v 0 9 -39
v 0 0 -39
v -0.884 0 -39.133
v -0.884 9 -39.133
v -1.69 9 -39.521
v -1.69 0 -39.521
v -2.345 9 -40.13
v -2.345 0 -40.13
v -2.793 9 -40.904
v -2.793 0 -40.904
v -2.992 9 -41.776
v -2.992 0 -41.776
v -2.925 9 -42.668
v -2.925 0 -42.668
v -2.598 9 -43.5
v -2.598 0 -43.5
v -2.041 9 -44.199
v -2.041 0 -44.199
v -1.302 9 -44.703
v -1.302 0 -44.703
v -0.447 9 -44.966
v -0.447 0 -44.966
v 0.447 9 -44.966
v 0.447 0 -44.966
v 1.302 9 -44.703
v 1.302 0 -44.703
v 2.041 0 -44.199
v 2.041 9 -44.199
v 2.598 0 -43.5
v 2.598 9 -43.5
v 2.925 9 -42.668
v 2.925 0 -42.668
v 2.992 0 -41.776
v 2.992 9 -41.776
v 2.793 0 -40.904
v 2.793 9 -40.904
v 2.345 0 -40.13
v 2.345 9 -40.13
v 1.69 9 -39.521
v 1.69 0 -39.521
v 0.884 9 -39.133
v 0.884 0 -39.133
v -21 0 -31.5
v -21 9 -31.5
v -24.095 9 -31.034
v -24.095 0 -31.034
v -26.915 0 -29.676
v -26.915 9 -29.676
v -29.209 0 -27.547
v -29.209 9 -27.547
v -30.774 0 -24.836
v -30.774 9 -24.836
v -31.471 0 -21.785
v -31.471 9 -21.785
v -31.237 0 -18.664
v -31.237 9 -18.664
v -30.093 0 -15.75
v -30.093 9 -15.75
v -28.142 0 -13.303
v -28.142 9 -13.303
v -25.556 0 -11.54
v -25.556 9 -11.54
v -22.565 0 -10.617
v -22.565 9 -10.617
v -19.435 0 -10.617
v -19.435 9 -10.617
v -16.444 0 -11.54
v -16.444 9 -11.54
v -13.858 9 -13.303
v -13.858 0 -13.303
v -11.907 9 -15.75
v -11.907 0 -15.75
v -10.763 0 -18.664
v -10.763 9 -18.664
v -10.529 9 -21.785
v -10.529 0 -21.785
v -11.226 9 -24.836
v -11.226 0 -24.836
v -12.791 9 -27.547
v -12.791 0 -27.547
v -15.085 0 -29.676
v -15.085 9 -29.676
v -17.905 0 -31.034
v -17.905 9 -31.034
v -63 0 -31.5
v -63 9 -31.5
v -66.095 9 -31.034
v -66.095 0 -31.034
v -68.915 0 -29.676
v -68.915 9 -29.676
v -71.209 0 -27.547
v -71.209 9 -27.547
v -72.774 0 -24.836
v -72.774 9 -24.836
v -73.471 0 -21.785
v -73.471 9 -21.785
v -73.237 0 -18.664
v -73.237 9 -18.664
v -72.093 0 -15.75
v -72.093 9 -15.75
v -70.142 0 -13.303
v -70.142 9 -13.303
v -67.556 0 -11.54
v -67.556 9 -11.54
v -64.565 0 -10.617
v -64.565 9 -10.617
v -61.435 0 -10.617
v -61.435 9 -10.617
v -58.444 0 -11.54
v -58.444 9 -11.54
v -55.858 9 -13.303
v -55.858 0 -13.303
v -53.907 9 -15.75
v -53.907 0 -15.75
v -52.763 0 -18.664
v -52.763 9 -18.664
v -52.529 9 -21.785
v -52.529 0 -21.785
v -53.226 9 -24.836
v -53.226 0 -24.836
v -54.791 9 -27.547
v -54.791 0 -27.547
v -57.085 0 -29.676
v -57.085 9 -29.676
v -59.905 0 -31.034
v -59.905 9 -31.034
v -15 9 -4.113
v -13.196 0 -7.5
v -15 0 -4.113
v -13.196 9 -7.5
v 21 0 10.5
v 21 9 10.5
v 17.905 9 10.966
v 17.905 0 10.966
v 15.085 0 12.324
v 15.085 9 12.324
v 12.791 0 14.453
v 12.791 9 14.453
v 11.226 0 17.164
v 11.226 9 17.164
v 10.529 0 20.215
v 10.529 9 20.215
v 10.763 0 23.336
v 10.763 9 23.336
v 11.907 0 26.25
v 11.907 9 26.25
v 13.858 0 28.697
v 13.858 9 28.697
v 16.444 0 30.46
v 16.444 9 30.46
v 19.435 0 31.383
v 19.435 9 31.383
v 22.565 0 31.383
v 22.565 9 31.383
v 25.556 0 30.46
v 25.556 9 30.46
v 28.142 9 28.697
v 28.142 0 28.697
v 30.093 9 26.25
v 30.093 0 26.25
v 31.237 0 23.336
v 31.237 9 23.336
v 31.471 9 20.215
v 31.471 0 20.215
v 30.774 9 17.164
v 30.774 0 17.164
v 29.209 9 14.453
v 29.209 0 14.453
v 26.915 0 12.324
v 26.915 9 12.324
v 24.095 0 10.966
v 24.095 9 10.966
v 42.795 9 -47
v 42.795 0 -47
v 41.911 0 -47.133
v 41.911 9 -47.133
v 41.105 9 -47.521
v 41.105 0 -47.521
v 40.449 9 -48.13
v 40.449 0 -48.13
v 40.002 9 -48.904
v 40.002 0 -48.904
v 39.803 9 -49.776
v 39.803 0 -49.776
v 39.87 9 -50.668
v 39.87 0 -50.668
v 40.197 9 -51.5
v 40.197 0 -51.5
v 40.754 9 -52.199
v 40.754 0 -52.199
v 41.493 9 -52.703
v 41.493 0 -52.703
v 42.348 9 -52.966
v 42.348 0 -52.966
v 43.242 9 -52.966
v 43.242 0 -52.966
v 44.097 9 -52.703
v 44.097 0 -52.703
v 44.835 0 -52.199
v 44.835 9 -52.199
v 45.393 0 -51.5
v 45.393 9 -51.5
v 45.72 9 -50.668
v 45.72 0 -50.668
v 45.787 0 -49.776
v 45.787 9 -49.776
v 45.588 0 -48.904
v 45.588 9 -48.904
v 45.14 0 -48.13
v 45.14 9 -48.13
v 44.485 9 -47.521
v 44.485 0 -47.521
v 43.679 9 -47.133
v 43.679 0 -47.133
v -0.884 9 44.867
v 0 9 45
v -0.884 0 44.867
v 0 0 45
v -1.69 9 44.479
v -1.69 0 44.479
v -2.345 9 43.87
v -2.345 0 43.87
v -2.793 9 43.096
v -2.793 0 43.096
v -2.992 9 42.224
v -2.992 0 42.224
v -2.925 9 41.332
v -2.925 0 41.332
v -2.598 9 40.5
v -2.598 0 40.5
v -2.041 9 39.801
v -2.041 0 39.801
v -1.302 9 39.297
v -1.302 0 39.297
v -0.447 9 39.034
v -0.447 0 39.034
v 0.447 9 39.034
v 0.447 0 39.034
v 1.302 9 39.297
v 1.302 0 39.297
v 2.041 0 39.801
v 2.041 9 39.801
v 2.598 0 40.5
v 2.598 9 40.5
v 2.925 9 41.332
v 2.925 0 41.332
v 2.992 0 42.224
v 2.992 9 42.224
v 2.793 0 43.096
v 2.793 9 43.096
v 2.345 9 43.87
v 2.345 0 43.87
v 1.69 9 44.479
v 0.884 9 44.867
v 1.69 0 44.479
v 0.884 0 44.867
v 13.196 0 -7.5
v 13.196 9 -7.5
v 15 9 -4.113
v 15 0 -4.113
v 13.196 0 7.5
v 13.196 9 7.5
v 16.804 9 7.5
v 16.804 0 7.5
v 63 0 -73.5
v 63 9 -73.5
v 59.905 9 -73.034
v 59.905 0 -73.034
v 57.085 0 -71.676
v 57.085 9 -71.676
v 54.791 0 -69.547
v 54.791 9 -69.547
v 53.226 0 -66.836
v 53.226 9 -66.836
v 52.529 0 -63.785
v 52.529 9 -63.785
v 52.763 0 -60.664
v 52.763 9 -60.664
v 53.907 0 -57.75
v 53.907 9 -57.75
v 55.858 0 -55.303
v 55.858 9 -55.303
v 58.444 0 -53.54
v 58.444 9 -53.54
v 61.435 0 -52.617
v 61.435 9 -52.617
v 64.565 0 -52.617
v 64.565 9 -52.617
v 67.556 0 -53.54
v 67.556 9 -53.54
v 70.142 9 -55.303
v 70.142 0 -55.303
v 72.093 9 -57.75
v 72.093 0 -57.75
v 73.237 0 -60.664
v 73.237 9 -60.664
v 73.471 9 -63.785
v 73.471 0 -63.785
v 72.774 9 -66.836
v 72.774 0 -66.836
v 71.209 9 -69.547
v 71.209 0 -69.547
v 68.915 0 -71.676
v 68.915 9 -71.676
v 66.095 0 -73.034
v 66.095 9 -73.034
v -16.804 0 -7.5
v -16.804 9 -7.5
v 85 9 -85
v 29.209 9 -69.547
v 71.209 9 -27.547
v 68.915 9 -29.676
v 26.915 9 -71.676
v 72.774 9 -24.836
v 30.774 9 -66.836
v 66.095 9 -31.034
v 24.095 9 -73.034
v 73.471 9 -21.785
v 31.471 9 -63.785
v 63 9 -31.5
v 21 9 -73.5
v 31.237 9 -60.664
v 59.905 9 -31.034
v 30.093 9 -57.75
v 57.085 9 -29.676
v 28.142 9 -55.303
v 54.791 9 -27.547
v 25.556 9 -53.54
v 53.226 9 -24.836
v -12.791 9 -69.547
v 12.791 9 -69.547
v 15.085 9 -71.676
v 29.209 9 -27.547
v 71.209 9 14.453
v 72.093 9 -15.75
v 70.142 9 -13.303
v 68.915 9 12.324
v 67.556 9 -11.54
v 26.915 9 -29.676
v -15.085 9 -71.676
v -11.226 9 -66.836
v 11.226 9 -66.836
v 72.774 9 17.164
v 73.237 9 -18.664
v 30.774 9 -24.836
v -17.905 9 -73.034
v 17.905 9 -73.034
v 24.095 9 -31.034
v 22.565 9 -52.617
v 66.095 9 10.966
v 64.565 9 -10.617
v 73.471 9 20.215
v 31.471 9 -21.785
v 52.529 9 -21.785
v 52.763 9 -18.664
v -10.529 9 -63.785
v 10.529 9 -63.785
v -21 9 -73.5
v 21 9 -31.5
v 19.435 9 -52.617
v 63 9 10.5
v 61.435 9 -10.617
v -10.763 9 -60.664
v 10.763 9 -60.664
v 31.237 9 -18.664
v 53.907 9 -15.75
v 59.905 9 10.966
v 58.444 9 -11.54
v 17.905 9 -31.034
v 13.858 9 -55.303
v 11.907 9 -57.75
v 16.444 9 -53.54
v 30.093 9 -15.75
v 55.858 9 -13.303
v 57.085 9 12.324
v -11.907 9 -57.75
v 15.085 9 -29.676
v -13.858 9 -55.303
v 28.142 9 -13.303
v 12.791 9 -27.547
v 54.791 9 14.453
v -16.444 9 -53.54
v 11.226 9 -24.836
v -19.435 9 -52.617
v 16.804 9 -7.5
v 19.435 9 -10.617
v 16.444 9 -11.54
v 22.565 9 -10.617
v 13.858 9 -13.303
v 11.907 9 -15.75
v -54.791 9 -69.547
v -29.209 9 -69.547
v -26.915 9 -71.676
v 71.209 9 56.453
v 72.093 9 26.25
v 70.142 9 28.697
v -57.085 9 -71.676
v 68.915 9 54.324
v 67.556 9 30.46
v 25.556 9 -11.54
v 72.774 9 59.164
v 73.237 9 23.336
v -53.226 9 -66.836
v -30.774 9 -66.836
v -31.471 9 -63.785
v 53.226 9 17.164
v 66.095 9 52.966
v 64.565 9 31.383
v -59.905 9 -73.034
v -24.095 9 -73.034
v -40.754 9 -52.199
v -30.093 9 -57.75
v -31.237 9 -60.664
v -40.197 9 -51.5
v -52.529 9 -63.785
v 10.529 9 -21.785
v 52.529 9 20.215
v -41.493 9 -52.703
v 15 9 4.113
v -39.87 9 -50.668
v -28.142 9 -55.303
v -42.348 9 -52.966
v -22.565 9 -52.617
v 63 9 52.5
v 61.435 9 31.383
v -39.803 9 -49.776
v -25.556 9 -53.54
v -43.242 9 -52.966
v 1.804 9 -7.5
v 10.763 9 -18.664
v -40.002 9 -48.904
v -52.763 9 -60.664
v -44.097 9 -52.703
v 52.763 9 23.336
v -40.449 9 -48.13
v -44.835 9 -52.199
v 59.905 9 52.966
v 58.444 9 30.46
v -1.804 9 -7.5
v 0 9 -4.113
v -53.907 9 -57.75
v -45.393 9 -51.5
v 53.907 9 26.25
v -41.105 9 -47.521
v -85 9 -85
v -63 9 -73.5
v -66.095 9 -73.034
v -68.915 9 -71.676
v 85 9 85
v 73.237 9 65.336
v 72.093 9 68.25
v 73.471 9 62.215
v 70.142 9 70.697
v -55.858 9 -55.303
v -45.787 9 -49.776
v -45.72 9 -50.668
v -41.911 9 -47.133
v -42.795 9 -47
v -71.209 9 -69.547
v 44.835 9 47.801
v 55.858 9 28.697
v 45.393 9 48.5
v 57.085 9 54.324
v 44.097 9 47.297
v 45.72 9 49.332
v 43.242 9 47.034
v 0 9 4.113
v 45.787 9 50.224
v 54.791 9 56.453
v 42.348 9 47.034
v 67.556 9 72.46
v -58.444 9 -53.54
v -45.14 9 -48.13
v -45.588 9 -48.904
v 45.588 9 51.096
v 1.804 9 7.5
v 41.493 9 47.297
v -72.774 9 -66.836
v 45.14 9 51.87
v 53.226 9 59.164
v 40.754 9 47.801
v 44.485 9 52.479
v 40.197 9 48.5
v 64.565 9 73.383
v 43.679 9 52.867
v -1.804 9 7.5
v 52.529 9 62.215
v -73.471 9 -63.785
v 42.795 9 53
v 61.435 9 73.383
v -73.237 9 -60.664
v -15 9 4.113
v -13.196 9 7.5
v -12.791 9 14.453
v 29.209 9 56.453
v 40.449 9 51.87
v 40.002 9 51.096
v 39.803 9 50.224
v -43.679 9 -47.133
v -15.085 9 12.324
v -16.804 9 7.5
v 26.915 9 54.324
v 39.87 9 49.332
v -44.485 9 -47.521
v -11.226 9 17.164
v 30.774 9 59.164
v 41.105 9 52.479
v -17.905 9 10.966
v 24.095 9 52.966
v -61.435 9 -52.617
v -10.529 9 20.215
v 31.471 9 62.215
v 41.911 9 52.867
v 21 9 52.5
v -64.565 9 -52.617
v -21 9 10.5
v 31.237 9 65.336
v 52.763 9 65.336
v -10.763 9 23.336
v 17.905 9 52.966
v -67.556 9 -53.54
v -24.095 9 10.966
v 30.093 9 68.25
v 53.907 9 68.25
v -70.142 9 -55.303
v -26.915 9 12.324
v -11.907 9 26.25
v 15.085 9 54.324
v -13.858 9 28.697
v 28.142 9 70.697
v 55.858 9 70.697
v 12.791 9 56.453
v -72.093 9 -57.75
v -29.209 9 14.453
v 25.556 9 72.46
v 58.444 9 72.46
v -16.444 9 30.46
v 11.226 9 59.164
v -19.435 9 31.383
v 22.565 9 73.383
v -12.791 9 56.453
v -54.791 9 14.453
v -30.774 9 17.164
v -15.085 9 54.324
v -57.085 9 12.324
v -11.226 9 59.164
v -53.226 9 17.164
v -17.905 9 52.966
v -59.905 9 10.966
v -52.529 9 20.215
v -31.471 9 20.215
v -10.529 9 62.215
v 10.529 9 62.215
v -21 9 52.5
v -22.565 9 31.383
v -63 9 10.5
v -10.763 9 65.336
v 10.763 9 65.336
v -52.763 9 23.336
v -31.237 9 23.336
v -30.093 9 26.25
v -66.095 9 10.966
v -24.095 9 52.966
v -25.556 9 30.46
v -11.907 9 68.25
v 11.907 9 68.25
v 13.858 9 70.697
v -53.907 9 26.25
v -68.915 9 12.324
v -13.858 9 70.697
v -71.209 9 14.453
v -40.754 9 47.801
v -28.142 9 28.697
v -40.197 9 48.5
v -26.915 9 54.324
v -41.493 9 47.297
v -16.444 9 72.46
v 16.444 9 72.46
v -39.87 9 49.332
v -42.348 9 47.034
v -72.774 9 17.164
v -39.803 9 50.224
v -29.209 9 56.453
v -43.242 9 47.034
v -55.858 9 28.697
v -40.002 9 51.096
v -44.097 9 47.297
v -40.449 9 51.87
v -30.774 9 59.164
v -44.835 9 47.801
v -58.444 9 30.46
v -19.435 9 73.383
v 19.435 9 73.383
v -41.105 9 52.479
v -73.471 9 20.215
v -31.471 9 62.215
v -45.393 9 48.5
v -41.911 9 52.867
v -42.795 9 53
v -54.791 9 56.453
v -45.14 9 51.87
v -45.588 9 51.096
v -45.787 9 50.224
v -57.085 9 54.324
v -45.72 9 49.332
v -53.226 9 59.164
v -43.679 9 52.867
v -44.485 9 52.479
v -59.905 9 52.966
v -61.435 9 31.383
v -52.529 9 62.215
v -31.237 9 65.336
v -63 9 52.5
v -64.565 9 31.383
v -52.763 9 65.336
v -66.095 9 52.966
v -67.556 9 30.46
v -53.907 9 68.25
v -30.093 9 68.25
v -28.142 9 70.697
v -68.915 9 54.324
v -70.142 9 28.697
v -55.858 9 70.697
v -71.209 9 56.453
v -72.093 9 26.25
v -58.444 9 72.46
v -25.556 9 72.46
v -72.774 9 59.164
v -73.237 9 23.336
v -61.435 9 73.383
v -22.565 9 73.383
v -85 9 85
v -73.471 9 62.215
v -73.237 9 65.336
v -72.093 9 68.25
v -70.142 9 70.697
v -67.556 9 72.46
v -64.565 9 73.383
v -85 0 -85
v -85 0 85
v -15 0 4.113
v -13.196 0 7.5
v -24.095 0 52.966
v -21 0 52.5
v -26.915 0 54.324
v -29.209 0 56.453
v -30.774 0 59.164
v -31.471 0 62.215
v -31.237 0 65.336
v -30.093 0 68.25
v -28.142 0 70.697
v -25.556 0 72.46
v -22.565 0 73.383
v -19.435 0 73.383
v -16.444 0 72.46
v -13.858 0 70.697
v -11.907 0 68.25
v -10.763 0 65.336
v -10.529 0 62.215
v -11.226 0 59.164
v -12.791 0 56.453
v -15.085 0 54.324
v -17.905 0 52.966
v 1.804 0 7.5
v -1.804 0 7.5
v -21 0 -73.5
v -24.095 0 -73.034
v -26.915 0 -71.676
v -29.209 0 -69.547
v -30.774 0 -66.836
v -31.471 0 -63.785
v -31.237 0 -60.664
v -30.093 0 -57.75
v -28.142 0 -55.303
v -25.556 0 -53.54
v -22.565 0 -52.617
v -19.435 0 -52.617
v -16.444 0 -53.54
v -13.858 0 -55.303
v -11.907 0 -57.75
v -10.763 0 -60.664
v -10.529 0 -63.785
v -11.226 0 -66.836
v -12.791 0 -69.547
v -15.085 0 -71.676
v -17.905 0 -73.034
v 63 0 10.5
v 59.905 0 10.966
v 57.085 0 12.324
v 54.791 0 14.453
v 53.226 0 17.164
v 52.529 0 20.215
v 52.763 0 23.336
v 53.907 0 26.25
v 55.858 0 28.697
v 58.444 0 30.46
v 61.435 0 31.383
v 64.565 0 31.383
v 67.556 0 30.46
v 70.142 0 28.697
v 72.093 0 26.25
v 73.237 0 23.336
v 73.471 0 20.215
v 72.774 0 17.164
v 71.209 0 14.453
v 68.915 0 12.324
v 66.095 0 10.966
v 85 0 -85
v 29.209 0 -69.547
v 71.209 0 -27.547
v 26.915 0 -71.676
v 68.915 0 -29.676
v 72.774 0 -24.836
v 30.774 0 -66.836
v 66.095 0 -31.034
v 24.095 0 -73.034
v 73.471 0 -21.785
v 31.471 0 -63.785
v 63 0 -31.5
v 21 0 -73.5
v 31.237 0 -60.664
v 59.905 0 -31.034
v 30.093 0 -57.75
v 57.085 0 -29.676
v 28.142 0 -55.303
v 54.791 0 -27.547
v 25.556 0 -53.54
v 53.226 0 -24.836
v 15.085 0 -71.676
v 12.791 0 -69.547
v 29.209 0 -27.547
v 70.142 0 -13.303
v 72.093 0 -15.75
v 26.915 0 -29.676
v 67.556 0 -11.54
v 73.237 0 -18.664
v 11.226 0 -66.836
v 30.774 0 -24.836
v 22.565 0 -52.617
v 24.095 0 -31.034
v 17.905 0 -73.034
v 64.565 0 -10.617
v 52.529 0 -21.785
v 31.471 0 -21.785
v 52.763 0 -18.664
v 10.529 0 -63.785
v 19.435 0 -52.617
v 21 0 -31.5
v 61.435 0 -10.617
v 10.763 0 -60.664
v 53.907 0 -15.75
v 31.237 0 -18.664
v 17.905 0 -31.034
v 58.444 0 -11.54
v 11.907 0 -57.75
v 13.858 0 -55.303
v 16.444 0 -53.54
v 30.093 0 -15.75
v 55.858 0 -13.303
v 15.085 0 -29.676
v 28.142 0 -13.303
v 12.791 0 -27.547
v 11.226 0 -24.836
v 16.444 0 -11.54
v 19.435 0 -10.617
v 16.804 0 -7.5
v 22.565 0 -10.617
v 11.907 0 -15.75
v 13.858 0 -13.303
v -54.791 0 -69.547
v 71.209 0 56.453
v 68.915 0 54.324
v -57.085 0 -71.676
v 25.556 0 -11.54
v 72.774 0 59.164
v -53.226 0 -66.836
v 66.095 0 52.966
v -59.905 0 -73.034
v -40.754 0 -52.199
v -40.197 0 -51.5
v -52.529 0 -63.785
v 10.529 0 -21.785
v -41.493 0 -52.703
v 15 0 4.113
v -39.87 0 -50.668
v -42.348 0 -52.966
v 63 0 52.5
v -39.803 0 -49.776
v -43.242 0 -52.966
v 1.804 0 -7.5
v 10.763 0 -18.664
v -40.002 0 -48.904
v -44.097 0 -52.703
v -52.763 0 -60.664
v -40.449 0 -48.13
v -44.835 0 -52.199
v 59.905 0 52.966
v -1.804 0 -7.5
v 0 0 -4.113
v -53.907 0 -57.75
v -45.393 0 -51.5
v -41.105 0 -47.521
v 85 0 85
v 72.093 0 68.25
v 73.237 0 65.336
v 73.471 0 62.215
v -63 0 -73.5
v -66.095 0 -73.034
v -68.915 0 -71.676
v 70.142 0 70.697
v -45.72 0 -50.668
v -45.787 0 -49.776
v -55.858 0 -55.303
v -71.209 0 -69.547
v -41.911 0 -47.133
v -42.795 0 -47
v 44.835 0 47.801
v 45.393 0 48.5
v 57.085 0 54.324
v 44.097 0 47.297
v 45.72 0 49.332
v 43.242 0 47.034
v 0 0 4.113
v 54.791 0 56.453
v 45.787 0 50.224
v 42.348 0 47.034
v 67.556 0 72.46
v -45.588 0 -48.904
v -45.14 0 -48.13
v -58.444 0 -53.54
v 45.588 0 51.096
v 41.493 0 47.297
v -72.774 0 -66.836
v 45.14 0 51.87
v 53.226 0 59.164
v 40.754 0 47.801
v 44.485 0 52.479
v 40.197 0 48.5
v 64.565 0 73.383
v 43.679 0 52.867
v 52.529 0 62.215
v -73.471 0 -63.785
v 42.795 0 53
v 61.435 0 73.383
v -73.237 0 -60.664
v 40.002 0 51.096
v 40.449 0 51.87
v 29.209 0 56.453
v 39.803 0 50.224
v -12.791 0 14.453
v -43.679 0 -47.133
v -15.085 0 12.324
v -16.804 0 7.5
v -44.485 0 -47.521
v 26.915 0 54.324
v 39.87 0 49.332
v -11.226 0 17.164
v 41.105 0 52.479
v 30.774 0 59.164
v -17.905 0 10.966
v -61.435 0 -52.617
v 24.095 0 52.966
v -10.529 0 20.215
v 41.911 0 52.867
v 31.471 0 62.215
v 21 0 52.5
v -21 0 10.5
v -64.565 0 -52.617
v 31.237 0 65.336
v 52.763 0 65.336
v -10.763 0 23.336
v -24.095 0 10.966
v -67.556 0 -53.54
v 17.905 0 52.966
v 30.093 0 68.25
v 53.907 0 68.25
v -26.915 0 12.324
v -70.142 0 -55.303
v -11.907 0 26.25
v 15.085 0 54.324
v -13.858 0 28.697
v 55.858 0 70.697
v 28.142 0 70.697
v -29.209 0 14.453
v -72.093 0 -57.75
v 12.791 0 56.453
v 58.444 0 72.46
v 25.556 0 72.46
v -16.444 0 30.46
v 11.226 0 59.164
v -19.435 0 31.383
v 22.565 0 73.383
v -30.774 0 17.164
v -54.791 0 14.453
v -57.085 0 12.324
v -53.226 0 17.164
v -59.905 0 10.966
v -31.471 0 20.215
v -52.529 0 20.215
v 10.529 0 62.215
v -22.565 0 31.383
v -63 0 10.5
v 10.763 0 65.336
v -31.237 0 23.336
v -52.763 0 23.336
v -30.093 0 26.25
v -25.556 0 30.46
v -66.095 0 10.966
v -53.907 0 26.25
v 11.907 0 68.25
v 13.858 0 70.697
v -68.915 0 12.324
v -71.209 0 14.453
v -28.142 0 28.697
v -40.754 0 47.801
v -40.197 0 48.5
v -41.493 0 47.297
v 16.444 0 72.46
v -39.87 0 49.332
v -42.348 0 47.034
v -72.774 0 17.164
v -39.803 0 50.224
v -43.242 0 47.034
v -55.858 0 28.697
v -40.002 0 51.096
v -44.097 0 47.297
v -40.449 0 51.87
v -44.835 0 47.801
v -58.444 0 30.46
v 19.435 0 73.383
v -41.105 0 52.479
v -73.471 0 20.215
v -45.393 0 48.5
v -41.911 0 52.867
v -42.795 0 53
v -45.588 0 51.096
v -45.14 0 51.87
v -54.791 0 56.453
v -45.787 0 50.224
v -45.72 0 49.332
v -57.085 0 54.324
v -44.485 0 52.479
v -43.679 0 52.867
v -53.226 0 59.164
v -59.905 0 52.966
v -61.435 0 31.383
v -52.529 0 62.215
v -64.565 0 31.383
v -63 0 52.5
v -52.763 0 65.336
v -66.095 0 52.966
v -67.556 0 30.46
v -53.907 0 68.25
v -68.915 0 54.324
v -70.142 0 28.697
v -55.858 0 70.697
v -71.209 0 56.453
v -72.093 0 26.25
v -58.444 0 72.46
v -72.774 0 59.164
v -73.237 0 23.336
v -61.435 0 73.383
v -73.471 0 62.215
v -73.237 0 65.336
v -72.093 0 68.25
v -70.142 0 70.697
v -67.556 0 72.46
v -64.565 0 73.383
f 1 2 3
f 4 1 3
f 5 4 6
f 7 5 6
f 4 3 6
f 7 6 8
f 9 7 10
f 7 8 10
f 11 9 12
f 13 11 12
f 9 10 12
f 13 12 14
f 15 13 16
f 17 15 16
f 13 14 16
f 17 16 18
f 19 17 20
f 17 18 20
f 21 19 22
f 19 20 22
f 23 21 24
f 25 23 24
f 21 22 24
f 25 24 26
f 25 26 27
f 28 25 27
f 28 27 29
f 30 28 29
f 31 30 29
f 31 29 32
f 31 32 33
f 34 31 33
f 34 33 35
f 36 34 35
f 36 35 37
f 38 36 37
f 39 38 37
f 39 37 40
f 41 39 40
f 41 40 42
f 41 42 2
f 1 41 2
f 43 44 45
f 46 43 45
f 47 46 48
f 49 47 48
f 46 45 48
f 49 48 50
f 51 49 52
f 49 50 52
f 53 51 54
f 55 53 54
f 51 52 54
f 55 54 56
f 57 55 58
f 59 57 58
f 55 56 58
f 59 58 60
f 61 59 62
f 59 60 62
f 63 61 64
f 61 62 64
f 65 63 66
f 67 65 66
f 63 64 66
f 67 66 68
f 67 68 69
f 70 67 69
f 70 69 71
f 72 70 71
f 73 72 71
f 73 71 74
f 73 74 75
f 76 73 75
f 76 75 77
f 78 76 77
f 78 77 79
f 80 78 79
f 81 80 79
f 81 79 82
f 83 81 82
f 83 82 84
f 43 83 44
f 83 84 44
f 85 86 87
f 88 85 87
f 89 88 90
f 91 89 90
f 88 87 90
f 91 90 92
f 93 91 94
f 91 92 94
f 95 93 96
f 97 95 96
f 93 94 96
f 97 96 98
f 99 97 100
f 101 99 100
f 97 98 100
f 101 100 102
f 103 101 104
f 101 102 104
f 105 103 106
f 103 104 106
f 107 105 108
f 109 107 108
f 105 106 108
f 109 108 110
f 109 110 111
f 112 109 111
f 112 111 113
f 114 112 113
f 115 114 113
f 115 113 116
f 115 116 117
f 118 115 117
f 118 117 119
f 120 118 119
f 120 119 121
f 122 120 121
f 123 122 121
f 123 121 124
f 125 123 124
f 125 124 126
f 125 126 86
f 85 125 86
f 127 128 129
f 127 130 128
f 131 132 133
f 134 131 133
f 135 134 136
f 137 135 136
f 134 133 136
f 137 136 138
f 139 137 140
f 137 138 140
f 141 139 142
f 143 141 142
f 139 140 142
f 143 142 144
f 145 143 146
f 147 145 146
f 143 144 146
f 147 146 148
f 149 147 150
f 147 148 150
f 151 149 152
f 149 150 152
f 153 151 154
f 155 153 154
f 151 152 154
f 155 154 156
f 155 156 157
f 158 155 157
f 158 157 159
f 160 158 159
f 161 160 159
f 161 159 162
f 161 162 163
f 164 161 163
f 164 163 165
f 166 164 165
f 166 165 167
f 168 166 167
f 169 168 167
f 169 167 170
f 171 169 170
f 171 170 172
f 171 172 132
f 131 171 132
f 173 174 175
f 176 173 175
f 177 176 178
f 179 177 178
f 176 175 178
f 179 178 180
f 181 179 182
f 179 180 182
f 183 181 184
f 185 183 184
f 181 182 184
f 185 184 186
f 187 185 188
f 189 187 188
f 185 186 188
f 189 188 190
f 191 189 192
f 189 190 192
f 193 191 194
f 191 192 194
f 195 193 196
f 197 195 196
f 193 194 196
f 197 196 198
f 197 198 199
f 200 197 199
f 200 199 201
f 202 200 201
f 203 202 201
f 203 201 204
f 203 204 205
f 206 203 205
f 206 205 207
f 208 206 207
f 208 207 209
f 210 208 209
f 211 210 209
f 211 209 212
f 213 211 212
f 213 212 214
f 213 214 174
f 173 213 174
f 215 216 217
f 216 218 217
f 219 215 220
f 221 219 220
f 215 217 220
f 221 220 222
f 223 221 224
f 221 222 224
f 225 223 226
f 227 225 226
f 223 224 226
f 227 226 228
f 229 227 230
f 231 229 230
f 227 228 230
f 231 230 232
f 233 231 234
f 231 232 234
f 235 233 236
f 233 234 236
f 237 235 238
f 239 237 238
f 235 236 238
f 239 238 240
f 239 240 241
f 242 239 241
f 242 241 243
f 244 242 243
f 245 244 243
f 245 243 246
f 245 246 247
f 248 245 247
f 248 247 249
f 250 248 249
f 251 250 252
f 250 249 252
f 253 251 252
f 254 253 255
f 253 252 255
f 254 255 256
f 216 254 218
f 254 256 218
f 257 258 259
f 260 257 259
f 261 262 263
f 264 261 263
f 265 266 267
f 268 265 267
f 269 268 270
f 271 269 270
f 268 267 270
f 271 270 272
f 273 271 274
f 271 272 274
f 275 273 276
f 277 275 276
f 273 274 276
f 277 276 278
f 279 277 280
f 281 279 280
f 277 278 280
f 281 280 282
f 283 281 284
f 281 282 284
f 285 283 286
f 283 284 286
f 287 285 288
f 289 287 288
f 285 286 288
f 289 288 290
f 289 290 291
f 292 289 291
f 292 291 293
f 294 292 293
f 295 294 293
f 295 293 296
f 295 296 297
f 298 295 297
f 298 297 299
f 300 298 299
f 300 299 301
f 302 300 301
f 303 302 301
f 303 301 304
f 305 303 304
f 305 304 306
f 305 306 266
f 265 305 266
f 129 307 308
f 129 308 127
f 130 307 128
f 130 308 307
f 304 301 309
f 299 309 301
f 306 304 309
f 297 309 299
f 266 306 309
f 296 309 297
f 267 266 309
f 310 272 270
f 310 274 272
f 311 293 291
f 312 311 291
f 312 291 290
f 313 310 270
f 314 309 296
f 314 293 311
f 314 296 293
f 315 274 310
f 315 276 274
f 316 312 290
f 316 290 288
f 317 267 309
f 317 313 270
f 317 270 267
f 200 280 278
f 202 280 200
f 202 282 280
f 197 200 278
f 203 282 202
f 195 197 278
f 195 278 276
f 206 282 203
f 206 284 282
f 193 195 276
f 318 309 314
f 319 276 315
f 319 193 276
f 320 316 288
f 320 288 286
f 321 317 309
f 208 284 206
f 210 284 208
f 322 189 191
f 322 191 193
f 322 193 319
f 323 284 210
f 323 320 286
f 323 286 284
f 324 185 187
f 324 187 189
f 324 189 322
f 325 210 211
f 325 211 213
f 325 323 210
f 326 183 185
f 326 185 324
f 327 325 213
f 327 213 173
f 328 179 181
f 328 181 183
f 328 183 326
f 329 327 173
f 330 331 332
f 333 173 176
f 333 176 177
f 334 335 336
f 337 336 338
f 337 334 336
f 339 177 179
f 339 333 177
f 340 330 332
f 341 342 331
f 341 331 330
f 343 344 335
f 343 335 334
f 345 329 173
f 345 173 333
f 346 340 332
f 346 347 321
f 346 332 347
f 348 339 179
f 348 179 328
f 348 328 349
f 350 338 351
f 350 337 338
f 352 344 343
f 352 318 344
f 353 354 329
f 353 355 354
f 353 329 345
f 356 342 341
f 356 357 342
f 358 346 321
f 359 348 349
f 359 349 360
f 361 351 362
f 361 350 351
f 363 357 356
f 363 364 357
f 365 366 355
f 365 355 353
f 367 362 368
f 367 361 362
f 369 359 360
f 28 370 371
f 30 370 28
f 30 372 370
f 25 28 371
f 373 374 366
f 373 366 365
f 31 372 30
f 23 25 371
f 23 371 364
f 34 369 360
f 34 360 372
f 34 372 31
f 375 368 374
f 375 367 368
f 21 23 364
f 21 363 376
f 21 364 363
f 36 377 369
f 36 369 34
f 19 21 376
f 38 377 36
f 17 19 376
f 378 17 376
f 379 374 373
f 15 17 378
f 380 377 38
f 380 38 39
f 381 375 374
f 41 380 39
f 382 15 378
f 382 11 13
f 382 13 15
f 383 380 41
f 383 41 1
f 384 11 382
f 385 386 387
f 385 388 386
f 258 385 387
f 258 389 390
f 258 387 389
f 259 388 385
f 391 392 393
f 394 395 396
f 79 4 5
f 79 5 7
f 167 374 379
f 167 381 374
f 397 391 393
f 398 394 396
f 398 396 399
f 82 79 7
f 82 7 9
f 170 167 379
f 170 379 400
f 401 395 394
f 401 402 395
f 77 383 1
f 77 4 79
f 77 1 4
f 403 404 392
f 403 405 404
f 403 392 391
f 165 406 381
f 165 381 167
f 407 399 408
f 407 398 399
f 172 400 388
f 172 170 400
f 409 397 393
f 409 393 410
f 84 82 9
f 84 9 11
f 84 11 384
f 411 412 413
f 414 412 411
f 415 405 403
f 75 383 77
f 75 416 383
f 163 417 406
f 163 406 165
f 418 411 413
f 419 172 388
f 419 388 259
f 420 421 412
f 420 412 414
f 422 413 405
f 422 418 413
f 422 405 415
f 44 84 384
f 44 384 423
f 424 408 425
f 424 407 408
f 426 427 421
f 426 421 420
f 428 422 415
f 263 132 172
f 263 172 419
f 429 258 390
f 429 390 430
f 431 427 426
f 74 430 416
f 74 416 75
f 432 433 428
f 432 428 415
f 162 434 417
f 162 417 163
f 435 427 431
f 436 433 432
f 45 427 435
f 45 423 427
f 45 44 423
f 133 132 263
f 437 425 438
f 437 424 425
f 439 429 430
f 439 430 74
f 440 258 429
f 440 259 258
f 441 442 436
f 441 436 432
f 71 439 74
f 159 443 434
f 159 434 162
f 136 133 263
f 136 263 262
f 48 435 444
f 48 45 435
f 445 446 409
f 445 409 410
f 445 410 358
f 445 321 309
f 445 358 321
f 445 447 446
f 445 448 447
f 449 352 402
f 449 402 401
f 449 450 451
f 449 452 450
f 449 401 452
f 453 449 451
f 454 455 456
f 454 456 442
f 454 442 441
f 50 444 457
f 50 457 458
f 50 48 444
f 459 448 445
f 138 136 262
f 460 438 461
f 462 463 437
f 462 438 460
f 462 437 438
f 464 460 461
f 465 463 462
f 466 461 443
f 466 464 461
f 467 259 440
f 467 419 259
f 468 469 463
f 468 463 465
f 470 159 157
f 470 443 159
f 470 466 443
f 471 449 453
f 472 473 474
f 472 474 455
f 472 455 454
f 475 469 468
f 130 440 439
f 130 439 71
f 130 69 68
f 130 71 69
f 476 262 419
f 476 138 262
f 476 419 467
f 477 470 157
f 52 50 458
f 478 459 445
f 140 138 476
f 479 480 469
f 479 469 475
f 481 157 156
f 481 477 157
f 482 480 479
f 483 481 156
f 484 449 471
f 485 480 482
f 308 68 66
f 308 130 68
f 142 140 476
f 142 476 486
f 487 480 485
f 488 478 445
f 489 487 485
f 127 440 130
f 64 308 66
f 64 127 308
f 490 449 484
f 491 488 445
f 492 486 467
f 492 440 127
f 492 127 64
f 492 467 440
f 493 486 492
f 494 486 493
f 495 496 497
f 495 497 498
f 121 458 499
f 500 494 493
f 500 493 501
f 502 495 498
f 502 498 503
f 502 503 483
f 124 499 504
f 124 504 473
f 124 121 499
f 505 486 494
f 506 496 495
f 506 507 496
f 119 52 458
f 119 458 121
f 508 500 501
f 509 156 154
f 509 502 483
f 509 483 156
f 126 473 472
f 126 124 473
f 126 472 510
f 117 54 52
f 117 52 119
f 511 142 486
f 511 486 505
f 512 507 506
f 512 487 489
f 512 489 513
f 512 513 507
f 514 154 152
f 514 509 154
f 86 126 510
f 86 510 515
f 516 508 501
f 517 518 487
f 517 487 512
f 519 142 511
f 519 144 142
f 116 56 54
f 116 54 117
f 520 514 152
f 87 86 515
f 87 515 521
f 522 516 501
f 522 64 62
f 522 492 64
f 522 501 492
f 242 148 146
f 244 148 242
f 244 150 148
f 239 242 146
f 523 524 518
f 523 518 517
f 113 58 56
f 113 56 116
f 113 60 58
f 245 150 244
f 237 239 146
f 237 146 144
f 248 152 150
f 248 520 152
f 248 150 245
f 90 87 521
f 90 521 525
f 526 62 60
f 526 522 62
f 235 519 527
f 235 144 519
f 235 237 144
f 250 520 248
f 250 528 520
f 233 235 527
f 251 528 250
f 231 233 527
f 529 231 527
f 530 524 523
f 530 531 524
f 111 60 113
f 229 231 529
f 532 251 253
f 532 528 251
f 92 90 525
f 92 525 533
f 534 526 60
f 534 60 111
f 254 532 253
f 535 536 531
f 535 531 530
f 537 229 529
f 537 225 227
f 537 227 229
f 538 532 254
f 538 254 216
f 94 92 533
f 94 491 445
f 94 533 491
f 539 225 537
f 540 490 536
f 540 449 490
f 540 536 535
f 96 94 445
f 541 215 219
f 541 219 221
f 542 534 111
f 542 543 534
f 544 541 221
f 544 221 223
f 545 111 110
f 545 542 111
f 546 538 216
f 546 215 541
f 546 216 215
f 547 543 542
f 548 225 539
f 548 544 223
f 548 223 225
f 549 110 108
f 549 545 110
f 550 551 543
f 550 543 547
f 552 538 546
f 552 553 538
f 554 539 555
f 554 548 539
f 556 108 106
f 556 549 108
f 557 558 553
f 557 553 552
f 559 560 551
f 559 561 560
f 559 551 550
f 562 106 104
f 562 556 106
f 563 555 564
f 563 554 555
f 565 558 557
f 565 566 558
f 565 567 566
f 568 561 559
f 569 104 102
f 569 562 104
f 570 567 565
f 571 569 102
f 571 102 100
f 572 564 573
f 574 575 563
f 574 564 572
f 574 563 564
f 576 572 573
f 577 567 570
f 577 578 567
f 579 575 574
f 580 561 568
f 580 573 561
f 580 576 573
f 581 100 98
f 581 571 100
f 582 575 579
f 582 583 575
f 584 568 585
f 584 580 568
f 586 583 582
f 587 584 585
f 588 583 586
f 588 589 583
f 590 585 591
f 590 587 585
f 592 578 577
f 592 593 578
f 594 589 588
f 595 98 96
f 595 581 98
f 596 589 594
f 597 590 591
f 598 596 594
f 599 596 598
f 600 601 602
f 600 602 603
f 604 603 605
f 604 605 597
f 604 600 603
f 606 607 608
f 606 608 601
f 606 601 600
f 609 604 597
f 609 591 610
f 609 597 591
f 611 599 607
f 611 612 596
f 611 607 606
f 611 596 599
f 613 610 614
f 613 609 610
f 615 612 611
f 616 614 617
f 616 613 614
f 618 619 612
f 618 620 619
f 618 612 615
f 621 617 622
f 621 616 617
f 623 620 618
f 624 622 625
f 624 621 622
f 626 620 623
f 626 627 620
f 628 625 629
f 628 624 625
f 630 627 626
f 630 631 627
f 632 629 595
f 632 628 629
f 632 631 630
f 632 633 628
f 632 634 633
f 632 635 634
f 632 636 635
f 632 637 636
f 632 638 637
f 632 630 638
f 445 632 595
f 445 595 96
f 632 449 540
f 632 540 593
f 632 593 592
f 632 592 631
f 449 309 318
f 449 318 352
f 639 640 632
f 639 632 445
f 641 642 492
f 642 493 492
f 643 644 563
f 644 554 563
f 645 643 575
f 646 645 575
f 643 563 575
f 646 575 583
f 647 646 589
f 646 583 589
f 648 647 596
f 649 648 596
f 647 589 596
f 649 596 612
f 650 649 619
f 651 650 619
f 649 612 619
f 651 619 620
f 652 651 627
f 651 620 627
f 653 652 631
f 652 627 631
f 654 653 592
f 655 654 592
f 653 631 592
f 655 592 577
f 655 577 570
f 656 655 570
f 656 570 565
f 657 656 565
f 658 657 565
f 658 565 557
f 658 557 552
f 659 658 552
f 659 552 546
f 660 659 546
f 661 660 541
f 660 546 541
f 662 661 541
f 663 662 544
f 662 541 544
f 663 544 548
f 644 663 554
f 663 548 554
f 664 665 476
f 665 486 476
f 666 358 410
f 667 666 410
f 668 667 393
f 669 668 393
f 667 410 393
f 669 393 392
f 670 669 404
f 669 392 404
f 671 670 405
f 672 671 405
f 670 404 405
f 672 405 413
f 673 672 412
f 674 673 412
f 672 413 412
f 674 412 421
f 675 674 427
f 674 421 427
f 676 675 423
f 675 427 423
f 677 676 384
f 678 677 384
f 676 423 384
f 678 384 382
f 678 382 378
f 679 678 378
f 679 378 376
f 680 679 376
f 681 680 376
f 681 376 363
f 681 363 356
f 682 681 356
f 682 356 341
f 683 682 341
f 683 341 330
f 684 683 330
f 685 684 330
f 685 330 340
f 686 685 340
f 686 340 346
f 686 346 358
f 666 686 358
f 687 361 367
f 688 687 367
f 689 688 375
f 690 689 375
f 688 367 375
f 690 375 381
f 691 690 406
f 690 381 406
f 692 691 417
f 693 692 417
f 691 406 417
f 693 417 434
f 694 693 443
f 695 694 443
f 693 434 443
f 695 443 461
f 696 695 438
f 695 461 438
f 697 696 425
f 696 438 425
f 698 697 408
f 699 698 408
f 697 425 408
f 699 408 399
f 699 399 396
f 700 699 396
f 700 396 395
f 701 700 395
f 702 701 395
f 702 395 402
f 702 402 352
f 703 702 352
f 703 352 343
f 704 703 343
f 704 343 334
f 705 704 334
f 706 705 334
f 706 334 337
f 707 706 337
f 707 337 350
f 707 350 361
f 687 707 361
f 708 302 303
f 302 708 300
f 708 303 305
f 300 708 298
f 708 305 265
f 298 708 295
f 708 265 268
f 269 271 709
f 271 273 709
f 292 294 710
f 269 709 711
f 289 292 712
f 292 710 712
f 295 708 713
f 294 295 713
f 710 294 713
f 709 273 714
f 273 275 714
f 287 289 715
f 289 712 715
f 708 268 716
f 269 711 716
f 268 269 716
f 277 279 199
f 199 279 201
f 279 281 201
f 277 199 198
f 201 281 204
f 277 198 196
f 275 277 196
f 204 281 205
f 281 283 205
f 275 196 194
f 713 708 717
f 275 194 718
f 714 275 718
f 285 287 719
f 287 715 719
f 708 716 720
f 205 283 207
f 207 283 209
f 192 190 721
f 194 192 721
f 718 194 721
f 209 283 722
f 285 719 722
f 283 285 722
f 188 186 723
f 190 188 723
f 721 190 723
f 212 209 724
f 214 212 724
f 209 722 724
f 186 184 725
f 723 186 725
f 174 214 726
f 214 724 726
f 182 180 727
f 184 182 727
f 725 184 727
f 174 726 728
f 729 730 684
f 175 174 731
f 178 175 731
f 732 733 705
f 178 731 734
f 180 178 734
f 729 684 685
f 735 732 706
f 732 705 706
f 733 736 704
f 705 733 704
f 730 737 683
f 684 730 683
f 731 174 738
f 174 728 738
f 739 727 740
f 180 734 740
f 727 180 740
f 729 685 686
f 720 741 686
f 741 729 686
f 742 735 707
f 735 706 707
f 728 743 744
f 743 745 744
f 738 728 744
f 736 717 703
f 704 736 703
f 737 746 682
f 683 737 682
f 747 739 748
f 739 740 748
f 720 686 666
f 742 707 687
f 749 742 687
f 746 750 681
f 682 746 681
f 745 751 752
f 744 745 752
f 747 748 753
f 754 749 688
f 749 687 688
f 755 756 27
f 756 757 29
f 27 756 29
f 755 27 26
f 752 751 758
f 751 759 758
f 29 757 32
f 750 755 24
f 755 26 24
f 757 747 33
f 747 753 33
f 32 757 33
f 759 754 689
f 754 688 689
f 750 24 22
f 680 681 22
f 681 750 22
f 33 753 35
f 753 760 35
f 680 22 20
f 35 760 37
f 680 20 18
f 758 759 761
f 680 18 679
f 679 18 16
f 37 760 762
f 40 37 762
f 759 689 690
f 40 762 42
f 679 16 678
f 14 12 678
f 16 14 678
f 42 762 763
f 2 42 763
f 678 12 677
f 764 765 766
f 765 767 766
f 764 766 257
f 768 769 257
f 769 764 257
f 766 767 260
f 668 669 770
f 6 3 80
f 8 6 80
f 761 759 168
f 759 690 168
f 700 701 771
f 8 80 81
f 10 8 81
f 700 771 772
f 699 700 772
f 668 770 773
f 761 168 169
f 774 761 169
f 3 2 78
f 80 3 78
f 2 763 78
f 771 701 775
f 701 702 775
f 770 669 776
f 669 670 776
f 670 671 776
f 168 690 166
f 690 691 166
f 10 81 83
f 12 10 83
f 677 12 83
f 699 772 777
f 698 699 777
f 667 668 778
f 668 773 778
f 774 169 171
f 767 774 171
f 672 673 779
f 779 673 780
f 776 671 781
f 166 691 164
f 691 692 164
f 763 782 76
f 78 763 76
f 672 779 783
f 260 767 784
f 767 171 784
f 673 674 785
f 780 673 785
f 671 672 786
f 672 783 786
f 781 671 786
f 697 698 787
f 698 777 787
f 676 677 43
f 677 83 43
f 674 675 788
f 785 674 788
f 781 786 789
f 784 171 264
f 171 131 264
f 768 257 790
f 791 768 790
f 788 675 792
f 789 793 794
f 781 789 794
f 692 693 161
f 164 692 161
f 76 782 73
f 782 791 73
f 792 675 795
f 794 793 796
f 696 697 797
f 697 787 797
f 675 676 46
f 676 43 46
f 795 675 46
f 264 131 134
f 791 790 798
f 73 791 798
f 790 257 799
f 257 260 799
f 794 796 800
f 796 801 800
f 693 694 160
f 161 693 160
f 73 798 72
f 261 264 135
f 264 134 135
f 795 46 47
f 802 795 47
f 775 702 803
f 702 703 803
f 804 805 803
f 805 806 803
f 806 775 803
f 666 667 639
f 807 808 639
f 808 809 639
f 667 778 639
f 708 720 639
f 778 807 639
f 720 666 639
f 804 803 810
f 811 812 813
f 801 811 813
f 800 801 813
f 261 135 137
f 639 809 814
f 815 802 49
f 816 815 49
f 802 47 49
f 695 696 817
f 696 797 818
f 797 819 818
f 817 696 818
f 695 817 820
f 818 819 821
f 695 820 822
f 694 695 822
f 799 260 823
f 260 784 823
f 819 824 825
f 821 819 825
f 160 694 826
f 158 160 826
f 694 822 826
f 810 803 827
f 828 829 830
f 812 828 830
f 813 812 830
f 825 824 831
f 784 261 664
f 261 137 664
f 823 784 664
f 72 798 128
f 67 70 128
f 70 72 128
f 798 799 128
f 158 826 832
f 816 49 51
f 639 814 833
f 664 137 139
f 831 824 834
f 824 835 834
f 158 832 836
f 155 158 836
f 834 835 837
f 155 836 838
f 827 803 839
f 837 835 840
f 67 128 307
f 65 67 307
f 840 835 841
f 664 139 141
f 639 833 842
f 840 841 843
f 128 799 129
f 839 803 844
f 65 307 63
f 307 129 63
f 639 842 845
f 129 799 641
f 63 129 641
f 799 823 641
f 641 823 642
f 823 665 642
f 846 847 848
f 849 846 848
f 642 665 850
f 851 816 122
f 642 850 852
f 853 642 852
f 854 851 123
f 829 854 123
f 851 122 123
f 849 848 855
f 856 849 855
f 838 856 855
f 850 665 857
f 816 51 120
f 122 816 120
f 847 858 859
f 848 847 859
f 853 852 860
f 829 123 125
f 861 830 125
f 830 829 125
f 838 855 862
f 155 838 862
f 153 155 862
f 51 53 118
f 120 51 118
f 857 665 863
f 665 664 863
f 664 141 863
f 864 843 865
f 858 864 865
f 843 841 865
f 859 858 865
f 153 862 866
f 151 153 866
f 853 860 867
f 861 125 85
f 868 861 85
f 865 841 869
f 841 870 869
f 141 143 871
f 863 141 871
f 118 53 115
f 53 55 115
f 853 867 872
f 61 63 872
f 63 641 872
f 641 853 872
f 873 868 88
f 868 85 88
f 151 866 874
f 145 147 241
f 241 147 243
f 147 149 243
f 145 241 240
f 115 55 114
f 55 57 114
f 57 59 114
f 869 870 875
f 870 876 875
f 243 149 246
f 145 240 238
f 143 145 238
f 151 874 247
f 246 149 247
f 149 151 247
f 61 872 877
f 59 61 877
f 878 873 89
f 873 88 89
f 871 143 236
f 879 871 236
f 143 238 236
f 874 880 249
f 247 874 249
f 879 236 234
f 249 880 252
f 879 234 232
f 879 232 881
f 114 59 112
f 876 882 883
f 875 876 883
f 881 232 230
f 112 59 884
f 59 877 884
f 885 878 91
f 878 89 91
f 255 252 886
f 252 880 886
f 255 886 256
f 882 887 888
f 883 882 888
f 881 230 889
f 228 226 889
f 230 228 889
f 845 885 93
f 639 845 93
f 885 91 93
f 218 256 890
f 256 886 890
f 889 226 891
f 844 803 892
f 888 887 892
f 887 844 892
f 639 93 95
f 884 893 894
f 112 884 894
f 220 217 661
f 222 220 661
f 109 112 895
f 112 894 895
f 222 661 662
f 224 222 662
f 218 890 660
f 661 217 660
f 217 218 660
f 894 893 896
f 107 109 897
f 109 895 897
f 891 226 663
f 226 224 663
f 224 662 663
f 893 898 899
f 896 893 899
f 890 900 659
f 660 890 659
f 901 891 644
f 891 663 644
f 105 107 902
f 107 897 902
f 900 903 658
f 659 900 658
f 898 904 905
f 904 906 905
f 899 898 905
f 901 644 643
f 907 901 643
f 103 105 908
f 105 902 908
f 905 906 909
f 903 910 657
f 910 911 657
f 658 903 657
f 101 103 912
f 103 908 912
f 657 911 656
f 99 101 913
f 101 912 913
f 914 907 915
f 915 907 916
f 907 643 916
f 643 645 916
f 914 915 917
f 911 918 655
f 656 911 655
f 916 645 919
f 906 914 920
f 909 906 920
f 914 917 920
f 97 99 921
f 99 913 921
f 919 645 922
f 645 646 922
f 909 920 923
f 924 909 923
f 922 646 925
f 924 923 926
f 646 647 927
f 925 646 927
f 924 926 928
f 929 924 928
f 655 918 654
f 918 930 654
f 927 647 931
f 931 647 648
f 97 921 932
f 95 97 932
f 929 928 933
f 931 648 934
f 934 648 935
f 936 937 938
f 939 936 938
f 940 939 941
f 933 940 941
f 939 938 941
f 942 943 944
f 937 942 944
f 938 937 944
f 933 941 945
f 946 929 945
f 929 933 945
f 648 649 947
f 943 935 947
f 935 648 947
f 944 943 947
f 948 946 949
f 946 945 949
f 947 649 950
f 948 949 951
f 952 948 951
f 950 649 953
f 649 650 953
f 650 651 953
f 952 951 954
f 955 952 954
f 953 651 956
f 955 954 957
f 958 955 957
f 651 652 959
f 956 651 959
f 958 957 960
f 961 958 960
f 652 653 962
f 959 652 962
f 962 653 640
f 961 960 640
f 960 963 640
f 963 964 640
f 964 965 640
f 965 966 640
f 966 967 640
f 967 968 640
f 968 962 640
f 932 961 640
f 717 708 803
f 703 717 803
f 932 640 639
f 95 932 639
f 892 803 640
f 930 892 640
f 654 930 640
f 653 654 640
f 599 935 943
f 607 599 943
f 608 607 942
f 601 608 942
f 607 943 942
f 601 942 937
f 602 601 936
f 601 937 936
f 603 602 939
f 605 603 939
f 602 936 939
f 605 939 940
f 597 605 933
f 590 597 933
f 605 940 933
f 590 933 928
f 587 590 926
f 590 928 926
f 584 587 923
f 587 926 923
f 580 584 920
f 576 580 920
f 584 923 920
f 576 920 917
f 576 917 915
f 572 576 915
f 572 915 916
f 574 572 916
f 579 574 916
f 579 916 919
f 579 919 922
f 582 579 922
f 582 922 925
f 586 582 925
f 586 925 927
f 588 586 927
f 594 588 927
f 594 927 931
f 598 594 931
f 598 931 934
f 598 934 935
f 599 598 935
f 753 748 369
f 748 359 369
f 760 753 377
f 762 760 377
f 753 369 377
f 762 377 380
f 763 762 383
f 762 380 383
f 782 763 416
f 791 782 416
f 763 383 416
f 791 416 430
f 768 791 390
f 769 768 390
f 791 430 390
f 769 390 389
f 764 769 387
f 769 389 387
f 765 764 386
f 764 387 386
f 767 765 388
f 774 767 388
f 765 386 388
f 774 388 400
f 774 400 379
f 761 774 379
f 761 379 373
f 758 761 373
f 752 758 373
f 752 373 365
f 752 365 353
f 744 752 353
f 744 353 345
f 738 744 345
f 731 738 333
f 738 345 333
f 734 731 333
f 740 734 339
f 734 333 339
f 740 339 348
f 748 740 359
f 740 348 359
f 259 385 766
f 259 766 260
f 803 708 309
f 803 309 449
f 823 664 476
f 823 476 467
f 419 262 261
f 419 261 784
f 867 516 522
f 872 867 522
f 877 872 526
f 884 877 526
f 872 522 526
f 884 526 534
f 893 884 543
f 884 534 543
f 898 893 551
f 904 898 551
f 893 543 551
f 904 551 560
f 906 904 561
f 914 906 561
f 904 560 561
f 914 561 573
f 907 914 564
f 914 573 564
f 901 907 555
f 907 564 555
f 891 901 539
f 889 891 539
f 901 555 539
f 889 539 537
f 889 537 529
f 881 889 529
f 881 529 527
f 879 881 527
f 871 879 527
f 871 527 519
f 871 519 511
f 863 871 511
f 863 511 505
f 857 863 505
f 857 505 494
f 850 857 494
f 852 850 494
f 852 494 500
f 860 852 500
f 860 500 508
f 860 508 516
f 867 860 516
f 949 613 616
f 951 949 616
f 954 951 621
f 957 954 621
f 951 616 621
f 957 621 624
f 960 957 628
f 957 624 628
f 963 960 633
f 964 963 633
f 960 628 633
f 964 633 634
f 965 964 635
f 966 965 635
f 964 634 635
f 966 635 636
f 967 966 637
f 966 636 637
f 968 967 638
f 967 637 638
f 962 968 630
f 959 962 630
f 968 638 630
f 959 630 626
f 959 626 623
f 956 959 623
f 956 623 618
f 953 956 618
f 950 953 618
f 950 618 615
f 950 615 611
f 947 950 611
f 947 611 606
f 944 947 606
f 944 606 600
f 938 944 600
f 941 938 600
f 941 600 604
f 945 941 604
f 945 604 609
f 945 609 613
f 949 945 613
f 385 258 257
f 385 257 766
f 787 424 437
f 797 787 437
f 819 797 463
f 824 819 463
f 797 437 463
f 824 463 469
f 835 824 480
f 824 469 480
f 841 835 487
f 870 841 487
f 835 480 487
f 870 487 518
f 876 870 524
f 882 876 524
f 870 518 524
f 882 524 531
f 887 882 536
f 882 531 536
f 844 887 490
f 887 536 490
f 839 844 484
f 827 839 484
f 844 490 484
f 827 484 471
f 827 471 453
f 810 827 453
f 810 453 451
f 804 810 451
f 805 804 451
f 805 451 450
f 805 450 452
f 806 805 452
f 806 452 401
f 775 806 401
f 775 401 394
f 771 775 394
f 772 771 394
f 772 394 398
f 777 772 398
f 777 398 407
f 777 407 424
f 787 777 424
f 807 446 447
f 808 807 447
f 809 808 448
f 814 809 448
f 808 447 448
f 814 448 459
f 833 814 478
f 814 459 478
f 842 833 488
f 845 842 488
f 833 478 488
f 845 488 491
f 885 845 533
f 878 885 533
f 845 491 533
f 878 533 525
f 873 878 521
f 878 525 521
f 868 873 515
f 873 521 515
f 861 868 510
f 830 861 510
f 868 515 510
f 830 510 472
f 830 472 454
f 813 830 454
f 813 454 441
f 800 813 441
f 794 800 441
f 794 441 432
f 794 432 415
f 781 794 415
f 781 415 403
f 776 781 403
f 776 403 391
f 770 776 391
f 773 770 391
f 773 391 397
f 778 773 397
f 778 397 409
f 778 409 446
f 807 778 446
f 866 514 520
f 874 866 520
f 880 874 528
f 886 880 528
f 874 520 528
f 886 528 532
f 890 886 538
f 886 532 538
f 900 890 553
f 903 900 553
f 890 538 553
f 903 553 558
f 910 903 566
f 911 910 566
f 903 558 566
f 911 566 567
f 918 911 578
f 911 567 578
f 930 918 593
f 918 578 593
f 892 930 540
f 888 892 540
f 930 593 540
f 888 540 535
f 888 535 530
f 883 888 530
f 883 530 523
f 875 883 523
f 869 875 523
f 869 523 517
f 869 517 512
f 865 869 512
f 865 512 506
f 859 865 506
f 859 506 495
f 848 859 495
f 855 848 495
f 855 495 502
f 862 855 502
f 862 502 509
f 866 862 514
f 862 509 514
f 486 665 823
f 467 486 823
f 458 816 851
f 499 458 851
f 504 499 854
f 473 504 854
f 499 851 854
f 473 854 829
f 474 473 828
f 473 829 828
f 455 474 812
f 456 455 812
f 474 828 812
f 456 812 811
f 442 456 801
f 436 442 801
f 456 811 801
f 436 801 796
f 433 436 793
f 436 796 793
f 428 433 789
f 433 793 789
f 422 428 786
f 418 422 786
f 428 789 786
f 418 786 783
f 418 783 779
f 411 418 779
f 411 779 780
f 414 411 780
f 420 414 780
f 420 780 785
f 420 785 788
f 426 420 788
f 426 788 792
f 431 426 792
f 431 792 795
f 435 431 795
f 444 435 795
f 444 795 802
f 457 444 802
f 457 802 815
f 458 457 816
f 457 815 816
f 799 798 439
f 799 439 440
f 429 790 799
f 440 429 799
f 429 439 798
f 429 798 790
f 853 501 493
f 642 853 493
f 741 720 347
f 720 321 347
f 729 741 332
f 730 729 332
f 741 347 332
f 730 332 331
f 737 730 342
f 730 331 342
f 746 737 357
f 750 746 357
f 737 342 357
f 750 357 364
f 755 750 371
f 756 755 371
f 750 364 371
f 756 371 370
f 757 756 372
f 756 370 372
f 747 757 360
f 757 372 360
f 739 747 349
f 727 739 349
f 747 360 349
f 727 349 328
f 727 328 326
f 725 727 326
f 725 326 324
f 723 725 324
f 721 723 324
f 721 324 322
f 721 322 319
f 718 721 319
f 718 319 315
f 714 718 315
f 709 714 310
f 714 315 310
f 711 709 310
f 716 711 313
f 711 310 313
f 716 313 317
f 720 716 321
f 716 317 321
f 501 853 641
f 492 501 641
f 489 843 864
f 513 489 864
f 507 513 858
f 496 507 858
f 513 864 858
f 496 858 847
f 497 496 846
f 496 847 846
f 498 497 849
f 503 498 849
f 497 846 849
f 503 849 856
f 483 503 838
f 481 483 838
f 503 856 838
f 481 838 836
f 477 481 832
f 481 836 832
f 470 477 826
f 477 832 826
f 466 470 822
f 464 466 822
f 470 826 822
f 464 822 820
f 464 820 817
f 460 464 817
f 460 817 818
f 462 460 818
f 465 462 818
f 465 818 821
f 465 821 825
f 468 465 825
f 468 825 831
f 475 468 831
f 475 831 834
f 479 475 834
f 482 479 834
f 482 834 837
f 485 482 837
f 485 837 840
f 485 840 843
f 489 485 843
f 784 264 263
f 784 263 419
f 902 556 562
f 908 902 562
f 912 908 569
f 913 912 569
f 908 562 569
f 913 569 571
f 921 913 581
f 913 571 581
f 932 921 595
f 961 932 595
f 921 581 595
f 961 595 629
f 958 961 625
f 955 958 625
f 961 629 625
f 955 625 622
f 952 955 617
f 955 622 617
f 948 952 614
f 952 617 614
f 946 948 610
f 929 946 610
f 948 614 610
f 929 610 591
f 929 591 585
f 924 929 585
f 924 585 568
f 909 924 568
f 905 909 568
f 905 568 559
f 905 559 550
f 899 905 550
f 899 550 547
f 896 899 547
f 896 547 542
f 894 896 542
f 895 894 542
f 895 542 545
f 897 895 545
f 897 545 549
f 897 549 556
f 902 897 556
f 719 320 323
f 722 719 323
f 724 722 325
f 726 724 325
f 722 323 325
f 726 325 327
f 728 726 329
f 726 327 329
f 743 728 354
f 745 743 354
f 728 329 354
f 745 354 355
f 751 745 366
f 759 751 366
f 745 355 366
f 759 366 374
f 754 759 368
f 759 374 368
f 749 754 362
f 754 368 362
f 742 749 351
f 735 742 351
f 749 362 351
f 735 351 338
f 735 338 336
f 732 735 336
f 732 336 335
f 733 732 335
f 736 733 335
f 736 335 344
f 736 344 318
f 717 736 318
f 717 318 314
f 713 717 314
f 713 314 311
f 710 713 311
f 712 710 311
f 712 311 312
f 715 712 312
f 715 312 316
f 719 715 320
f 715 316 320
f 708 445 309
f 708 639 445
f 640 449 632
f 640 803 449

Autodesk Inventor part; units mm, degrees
ref_plane "YZ Plane" through (0, 0, 0) normal (1, 0, 0) x (0, 1, 0)
ref_plane "XZ Plane" through (0, 0, 0) normal (0, 1, 0) x (-1, 0, 0)
ref_plane "XY Plane" through (0, 0, 0) normal (0, 0, 1) x (1, 0, 0)
sketch "Sketch1" plane through (0, 0, 0) normal (0, 1, 0) x (-1, 0, 0)
  line L0 (-85, 85) -> (85, 85)
  line L1 (85, 85) -> (85, -85)
  line L2 (85, -85) -> (-85, -85)
  line L3 (-85, -85) -> (-85, 85)
  line L4 (-85, 85) -> (85, -85) construction
  line L5 (85, 85) -> (-85, -85) construction
  point P0 (0, 0)
  point P1 (-63, -63)
  point P2 (-63, -21)
  point P3 (-63, 21)
  point P4 (-63, 63)
  point P5 (-21, -63)
  point P6 (-21, -21)
  point P7 (-21, 21)
  point P8 (-21, 63)
  point P9 (21, -63)
  point P10 (21, -21)
  point P11 (21, 21)
  point P12 (21, 63)
  point P13 (63, -63)
  point P14 (63, -21)
  point P15 (63, 21)
  point P16 (63, 63)
  dimension "d0" = 170
  dimension "d1" = 170
  dimension "d4" = 42
  dimension "d7" = 42
extrude "Extrusion1" add sketch "Sketch1" along normal blind 9
hole "Hole1" at (63, 0, -63) at (63, 0, -21) at (63, 0, 21) at (63, 0, 63) at (21, 0, -63) at (21, 0, -21) at (21, 0, 21) at (21, 0, 63) at (-21, 0, -63) at (-21, 0, -21) at (-21, 0, 21) at (-21, 0, 63) at (-63, 0, -63) at (-63, 0, -21) at (-63, 0, 21) at (-63, 0, 63) direction (0, 1, 0) diameter 21 end through all both
sketch "Sketch2" plane through (0, 9, 0) normal (0, 1, 0) x (1, 0, 0)
  line L0 (-33.7, -4.15) -> (33.7, -4.15)
  line L1 (33.7, -4.15) -> (33.7, 4.15)
  line L2 (33.7, 4.15) -> (-33.7, 4.15)
  line L3 (-33.7, 4.15) -> (-33.7, -4.15)
  line L4 (-33.7, -4.15) -> (33.7, 4.15) construction
  line L5 (33.7, -4.15) -> (-33.7, 4.15) construction
  point P0 (0, 0)
  dimension "d19" = 67.4
  dimension "d20" = 8.3
sketch "Sketch3" plane through (0, 9, 0) normal (0, 1, 0) x (1, 0, 0)
  line L0 (-42.7949, -50) -> (42.7949, -50) construction
  line L1 (42.7949, -50) -> (42.7949, 50) construction
  line L2 (42.7949, 50) -> (-42.7949, 50) construction
  line L3 (-42.7949, 50) -> (-42.7949, -50) construction
  line L4 (-42.7949, -50) -> (42.7949, 50) construction
  line L5 (42.7949, -50) -> (-42.7949, 50) construction
  point P0 (25, -42.5)
  point P1 (0, 0)
  dimension "d31" = 100
hole "Hole3" at (-42.7949, 9, -50) at (42.7949, 9, -50) at (42.7949, 9, 50) at (-42.7949, 9, 50) direction (0, -1, 0) diameter 6 end through all both
sketch "Sketch4" plane through (0, 9, 0) normal (0, 1, 0) x (1, 0, 0)
  circle A0 centre (42.7949, -50) radius 3 construction
  circle A1 centre (-42.7949, 50) radius 3 construction
  circle A2 centre (42.7949, 50) radius 3 construction
  circle A3 centre (-42.7949, -50) radius 3 construction
  circle A4 centre (-63, -21) radius 10.5 construction
  circle A5 centre (-63, 63) radius 10.5 construction
  circle A6 centre (-21, -21) radius 10.5 construction
  circle A7 centre (-21, 63) radius 10.5 construction
  circle A8 centre (21, -21) radius 10.5 construction
  circle A9 centre (21, 63) radius 10.5 construction
  circle A10 centre (63, -21) radius 10.5 construction
  circle A11 centre (63, 63) radius 10.5 construction
  circle A12 centre (63, 21) radius 10.5 construction
  circle A13 centre (63, -63) radius 10.5 construction
  circle A14 centre (21, 21) radius 10.5 construction
  circle A15 centre (21, -63) radius 10.5 construction
  circle A16 centre (-21, 21) radius 10.5 construction
  circle A17 centre (-21, -63) radius 10.5 construction
  circle A18 centre (-63, 21) radius 10.5 construction
  circle A19 centre (-63, -63) radius 10.5 construction
  line L0 (-85, -85) -> (85, -85) construction
  line L1 (85, -85) -> (85, 85) construction
  line L2 (85, 85) -> (-85, 85) construction
  line L3 (-85, 85) -> (-85, -85) construction
  line L4 (-85, 85) -> (85, 85) construction
  line L5 (-7.5, -85) -> (7.5, -85) construction
  line L6 (7.5, -85) -> (7.5, 85) construction
  line L7 (7.5, 85) -> (-7.5, 85) construction
  line L8 (-7.5, 85) -> (-7.5, -85) construction
  line L9 (-7.5, -85) -> (7.5, 85) construction
  line L10 (7.5, -85) -> (-7.5, 85) construction
  line L11 (-21, 63) -> (21, 63) construction
  line L12 (21, 63) -> (21, 21) construction
  line L13 (21, 21) -> (-21, 21) construction
  line L14 (-21, 21) -> (-21, 63) construction
  line L15 (-85, 0) -> (85, 0) construction
  point P0 (0, 0)
  point P1 (0, 42)
  point P2 (0, -42)
  dimension "d39" = 15
hole "Hole4" at (0, 9, -42) at (0, 9, 42) direction (0, -1, 0) diameter 6 end through all both
sketch "Sketch5" plane through (0, 9, 0) normal (0, 1, 0) x (1, 0, 0)
  line L0 (-33.7, -7.5) -> (33.7, -7.5) construction
  line L1 (33.7, -7.5) -> (33.7, 7.5) construction
  line L2 (33.7, 7.5) -> (-33.7, 7.5) construction
  line L3 (-33.7, 7.5) -> (-33.7, -7.5) construction
  line L4 (-33.7, -7.5) -> (33.7, 7.5) construction
  line L5 (33.7, -7.5) -> (-33.7, 7.5) construction
  line L6 (0, 7.5) -> (0, -7.5) construction
  line L7 (-1.8038, 7.5) -> (0, 4.1128)
  line L8 (1.8038, 7.5) -> (0, 4.1128)
  line L9 (-1.8038, 7.5) -> (1.8038, 7.5)
  line L10 (-33.7, 0) -> (33.7, 0) construction
  line L11 (-1.8038, -7.5) -> (0, -4.1128)
  line L12 (1.8038, -7.5) -> (0, -4.1128)
  line L13 (-1.8038, -7.5) -> (1.8038, -7.5)
  line L14 (-16.8038, 7.5) -> (-15, 4.1128)
  line L15 (-13.1962, 7.5) -> (-15, 4.1128)
  line L16 (-16.8038, 7.5) -> (-13.1962, 7.5)
  line L17 (13.1962, 7.5) -> (15, 4.1128)
  line L18 (16.8038, 7.5) -> (15, 4.1128)
  line L19 (13.1962, 7.5) -> (16.8038, 7.5)
  line L20 (-1.8038, 7.5) -> (0, 4.1128)
  line L21 (1.8038, 7.5) -> (0, 4.1128)
  line L22 (-1.8038, 7.5) -> (1.8038, 7.5)
  line L23 (-16.8038, -7.5) -> (-15, -4.1128)
  line L24 (-13.1962, -7.5) -> (-15, -4.1128)
  line L25 (-16.8038, -7.5) -> (-13.1962, -7.5)
  line L26 (13.1962, -7.5) -> (15, -4.1128)
  line L27 (16.8038, -7.5) -> (15, -4.1128)
  line L28 (13.1962, -7.5) -> (16.8038, -7.5)
  point P0 (0, 0)
  point P1 (-15, 7.5)
  point P2 (15, 7.5)
  point P3 (-15, -7.5)
  point P4 (15, -7.5)
  dimension "d47" = 67.4
  dimension "d50" = 15
  dimension "d53" = 15
  dimension "d56" = 15
extrude "Extrusion2" cut sketch "Sketch5" against normal blind 10 contours L9 L8 L7 | L11 L12 L13
extrude "Extrusion3" cut sketch "Sketch5" against normal blind 10 contours L16 L15 L14 | L19 L18 L17 | L23 L24 L25 | L26 L27 L28
properties part number "back_plate"
